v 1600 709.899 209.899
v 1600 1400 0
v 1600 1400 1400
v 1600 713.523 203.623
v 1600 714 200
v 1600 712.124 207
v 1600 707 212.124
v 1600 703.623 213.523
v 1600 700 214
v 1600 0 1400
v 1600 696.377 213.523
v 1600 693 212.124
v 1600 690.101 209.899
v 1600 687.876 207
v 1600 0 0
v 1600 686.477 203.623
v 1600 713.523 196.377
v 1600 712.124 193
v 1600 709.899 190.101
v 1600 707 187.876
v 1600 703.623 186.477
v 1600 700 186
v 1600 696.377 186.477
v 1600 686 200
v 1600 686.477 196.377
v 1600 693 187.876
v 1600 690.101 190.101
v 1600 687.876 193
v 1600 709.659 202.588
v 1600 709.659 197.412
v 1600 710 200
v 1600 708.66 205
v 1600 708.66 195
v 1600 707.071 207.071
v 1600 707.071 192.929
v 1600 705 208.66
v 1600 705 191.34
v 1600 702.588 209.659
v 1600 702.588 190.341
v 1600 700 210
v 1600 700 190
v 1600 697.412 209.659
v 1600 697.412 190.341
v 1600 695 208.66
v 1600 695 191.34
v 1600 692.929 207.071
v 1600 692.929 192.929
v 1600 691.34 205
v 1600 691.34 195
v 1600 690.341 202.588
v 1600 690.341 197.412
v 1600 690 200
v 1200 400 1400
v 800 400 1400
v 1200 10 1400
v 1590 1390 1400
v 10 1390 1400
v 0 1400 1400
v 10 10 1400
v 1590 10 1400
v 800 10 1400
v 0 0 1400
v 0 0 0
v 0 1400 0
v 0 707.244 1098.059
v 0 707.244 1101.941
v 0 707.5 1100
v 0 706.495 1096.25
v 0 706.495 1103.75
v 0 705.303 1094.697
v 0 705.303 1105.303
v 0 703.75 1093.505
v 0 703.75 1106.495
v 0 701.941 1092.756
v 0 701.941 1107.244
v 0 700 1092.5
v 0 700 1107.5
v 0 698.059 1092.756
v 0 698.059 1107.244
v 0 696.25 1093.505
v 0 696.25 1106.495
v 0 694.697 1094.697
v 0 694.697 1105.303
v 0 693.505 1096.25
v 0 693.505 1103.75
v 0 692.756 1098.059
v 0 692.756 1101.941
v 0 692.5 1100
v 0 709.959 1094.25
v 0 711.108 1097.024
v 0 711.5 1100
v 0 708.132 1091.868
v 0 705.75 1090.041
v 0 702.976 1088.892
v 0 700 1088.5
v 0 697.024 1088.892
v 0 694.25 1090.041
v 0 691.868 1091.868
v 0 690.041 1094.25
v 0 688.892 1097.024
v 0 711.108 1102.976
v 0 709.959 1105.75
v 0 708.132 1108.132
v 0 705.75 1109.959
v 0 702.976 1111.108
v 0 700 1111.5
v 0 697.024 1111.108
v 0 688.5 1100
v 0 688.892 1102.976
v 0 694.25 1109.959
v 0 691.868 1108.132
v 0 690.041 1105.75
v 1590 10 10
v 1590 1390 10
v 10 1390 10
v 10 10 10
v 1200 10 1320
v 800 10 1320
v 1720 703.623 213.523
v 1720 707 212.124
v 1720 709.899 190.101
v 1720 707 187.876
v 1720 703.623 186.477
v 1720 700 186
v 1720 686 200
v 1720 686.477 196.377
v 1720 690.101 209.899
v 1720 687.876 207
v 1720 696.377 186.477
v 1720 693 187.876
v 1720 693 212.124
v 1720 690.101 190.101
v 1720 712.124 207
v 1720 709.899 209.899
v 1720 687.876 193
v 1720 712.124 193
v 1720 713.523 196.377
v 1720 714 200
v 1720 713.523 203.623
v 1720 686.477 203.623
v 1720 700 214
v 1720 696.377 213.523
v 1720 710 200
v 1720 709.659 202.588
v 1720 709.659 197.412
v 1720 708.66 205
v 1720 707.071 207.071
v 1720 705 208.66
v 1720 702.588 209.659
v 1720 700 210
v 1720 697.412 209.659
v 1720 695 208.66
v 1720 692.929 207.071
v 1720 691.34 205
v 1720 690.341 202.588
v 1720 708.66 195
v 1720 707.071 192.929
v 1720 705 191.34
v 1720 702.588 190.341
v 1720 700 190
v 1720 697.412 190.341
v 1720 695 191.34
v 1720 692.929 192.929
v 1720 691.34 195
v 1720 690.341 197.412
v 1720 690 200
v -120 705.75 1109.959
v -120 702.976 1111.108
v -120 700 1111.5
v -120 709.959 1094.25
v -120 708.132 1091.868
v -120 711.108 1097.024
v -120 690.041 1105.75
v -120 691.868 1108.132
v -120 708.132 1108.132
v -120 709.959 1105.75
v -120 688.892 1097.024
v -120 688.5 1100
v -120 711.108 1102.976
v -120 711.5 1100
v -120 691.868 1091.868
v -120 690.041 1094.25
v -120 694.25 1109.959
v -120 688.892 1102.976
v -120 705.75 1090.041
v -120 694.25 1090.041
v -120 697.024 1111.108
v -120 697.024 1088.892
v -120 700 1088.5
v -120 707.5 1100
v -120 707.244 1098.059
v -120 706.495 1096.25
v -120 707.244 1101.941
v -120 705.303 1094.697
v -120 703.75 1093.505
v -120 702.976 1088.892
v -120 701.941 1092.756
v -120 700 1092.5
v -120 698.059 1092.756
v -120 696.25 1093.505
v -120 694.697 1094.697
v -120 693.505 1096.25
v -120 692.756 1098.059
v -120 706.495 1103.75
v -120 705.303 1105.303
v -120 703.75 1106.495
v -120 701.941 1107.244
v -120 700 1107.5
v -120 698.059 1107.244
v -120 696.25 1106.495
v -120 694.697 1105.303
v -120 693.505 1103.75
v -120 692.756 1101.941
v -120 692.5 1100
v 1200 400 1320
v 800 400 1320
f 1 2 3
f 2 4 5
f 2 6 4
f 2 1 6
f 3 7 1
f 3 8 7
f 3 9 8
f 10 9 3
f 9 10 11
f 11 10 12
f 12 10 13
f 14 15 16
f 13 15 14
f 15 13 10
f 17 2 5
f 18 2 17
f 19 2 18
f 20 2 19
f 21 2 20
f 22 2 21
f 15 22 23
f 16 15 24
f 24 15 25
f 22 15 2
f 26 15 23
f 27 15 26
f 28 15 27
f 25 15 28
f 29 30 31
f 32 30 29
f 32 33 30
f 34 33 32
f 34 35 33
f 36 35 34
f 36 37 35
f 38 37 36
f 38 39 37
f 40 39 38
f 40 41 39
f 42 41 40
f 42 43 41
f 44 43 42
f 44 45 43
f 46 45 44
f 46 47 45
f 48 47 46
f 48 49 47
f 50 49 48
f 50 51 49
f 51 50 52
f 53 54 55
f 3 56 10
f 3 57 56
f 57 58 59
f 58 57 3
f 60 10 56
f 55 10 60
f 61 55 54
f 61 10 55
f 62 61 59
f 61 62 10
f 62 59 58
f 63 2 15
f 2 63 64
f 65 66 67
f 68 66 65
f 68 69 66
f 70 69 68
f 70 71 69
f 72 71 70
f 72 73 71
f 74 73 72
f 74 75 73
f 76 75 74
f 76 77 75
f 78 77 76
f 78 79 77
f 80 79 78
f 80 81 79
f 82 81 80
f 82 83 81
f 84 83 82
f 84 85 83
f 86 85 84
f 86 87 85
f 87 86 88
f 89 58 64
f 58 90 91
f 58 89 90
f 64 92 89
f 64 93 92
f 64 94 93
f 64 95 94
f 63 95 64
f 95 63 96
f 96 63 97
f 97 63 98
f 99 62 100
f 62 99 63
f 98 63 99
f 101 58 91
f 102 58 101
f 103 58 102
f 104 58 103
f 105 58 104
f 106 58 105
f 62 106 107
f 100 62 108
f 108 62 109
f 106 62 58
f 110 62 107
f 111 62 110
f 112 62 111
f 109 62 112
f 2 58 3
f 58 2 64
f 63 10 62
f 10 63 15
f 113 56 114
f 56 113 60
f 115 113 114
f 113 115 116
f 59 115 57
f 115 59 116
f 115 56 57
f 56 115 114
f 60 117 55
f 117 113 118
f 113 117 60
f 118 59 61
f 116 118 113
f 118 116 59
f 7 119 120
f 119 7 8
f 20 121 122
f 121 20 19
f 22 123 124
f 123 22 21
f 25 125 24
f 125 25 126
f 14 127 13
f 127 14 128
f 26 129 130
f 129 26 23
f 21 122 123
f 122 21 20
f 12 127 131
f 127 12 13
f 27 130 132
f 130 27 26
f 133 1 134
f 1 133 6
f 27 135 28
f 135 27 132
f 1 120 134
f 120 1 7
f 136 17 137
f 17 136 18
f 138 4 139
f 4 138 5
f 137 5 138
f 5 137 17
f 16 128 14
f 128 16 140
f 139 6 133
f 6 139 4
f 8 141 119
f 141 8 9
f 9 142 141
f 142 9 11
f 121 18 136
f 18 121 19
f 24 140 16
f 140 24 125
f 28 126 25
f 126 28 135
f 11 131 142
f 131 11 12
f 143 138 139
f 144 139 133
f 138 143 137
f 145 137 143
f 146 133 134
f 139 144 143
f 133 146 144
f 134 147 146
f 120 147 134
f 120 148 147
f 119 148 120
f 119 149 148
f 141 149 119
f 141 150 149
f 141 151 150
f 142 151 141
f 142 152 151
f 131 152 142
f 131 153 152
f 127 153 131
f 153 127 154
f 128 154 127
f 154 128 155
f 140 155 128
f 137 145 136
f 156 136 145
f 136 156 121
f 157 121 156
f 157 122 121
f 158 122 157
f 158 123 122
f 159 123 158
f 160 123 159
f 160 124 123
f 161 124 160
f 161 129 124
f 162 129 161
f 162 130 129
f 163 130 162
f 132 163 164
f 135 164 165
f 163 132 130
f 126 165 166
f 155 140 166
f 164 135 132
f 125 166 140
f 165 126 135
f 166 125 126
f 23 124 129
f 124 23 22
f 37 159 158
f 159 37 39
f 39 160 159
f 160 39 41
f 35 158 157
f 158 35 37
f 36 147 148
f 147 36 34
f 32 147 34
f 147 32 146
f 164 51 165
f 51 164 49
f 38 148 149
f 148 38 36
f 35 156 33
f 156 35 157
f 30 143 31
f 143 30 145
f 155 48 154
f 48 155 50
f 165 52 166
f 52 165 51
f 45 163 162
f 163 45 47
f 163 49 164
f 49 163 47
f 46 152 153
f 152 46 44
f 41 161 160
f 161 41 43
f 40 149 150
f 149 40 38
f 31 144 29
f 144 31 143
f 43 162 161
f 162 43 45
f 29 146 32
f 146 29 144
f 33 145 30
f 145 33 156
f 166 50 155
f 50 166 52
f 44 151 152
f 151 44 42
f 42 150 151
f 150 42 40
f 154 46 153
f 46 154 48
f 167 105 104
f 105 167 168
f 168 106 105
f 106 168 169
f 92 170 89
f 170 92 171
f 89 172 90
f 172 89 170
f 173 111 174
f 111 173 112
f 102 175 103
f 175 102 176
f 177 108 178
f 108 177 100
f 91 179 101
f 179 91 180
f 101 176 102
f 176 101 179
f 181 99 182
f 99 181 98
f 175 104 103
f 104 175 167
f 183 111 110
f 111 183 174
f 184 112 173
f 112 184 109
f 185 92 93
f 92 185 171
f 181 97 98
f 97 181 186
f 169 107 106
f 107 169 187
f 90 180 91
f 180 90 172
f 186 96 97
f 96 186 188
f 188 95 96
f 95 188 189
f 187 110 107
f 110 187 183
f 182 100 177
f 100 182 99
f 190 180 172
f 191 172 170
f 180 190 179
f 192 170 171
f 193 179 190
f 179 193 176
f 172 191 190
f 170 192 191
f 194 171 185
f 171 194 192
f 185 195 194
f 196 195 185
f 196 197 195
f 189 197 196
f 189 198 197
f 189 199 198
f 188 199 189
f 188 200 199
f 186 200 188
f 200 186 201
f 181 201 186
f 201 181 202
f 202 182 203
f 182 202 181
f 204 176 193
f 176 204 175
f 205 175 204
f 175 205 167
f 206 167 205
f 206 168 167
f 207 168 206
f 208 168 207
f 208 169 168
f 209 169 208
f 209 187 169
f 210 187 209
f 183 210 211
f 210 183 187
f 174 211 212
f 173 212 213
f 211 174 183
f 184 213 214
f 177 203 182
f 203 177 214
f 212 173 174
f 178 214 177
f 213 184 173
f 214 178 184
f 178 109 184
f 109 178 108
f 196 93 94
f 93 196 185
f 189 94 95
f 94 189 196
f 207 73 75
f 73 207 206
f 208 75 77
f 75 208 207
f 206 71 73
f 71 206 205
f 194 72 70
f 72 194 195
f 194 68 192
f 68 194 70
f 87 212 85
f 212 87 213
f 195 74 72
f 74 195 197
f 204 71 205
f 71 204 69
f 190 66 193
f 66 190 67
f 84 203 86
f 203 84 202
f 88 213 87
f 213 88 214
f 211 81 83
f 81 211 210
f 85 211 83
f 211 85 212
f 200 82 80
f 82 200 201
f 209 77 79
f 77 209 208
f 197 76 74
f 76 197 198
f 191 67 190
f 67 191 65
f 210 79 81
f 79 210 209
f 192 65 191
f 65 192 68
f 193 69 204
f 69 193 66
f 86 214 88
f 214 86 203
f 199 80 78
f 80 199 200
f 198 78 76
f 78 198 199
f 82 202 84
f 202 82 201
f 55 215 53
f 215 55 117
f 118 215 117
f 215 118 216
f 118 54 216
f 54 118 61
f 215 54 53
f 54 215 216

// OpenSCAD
// file: ../params.scad
// Shared millimetre parameters. Keep in lockstep with freecad/params.py.
// Module scale: 150 kg/day wet train. Walls are CPVC sheet, not metal.

$fn = 36;

WALL        = 12;     // CPVC sheet thickness
FLOOR       = 16;     // floor plate (trough sits on this)

// LEACH CSTR 1 — inside liquor box
CSTR_L      = 2000;
CSTR_W      = 1200;
CSTR_H      = 1400;   // liquid + freeboard
FREEBOARD   = 200;

// CSTR 2 weir (same vessel, +X wall)
WEIR_W      = 450;
WEIR_CREST  = CSTR_H - FREEBOARD;   // from inner floor
WEIR_SLOT_H = 80;
WEIR_LIP    = 120;    // external spout projection

// CSTR 3 floor auger — injection-molded PVC / FG
AUGER_D     = 140;    // flight OD
AUGER_SHAFT = 40;
AUGER_PITCH = 110;
AUGER_TROUGH_W = 180;
AUGER_TROUGH_H = 110;
AUGER_OFFSET_Y = 280; // trough centreline from inner -Y wall
AUGER_INCLINE  = 28;  // deg, lifts out of liquor toward +X

// mixer / nozzles (lid)
MIXER_D     = 50;
GAS_D       = 80;     // acid-gas takeoff
DROP_X      = 80;     // inner-X of shred drop slot
DROP_L      = 400;
DROP_W      = 250;
DROP_COAM   = 80;     // raised coaming around the slot

// LEACHATE PUMP / coarse strainer — −X wall, opposite the weir
PUMP_D      = 80;     // DN80
PUMP_Z      = 450;    // centreline above inner floor (submerged)
PUMP_Y      = 900;    // centreline from inner −Y (away from auger)
STRAINER_L  = 180;
STRAINER_W  = 140;
STRAINER_H  = 160;

// mezzanine feed train
MEZZ_H      = 2200;   // platform top above tank outer floor
MEZZ_L      = 1600;   // platform length in −X
MEZZ_THK    = 12;
HOPPER_L    = 700;
HOPPER_W    = 600;
HOPPER_H    = 800;
SHRED_L     = 500;
SHRED_W     = 500;
SHRED_H     = 450;
CONV_W      = 240;
CONV_H      = 120;
CONV_PLATE  = 6;      // trough plate
CONV_FLANGE = 40;
CONV_SPRING_D = 50;
CONV_SPRING_H = 80;
CONV_BOLT   = 10;     // M10 clearance
CONV_LEN    = 1800;   // default standalone length; plant instance is computed
DUST_D      = 150;    // dust-hood outlet to DUST header
AUGER_LIFT_L = 700;

// dewater belts + split (Phase A 4–6)
FDEW_L      = 1800;
FDEW_W      = 450;
FDEW_H      = 80;
FDEW_RISE   = 120;    // solids end higher so liquor runs back to weir
SDEW_L      = 1400;
SDEW_W      = 220;
SDEW_H      = 80;
SPLIT_L     = 600;
SPLIT_W     = 500;
SPLIT_H     = 400;
STUB_L      = 400;
STUB_W      = 300;
STUB_H      = 250;

// EW funnel cell
EW_L        = 600;    // along aisle (overflow direction)
EW_W        = 420;    // anode-cathode depth
EW_H        = 650;    // rectangular body
EW_FUNNEL_H = 220;
EW_VALVE_D  = 50;
EW_VALVE_L  = 60;
EW_MEM_T    = 4;      // CEM
EW_SLOT     = 10;     // membrane cassette slot
EW_PITCH    = 750;    // aisle spacing, centre to centre
AISLE_X0    = 200;
AISLE_Y     = -(EW_W + 2*WALL) - 400;
AISLE_Z     = 400;
BUND_H      = 150;
BUND_PAD    = 250;
SUMP_L      = 400;
SUMP_W      = 400;
SUMP_H      = 300;
VDF_D       = 700;
VDF_L       = 900;
PAIL_W      = 180;
HDR_D       = 80;
HDR_Z       = 1400;
PYRO_D      = 320;
PYRO_L      = 2800;

// Campus envelopes — lockstep with freecad/params.py
FARM_X=12000; FARM_Y=8000; FARM_L=12000; FARM_W=8000; FARM_H=4500;
FAB_X=12000;  FAB_Y=-6000; FAB_L=8000;   FAB_W=6000;  FAB_H=4000;
HAB_X=-8000;  HAB_Y=8000;  HAB_L=8000;   HAB_W=6000;  HAB_H=3200;
CRYO_X=-6000; CRYO_Y=-4000; CRYO_L=4000; CRYO_W=3000; CRYO_H=3000;
MFG_X=2000;   MFG_Y=9000;  MFG_L=6000;   MFG_W=4000;  MFG_H=3500;

LIFE_Z_GREY=900; LIFE_Z_UPW=1100; LIFE_Z_ETCH=1300;
LIFE_Z_O2=2800; LIFE_Z_N2=3000; LIFE_Z_CO2=3200;
LIFE_D_GREY=50; LIFE_D_UPW=40; LIFE_D_ETCH=32;
LIFE_D_GAS=25; LIFE_D_CO2=40;
// main file
// NUTRIENT DOSE — day tank + D2/D3.
include <../params.scad>;
$fn = 24;
L=1600; W=1400; H=1400; T=10;

module stub(d, l=120) {
    difference() {
        cylinder(h=l, d=d+8);
        translate([0,0,-1]) cylinder(h=l+2, d=d);
    }
}

module mfg_nutrient_dose() {
    difference() {
        cube([L, W, H]);
        translate([T, T, T]) cube([L-2*T, W-2*T, H]);
    }
    translate([L/2, L>0 ? 0 : 0, H-80]) cube([400, 400, 80]); // D1 tote pad
    translate([L, W/2, 200]) rotate([0,90,0]) stub(20);        // D2
    translate([0, W/2, 1100]) rotate([0,-90,0]) stub(15);      // D3
}

mfg_nutrient_dose();
